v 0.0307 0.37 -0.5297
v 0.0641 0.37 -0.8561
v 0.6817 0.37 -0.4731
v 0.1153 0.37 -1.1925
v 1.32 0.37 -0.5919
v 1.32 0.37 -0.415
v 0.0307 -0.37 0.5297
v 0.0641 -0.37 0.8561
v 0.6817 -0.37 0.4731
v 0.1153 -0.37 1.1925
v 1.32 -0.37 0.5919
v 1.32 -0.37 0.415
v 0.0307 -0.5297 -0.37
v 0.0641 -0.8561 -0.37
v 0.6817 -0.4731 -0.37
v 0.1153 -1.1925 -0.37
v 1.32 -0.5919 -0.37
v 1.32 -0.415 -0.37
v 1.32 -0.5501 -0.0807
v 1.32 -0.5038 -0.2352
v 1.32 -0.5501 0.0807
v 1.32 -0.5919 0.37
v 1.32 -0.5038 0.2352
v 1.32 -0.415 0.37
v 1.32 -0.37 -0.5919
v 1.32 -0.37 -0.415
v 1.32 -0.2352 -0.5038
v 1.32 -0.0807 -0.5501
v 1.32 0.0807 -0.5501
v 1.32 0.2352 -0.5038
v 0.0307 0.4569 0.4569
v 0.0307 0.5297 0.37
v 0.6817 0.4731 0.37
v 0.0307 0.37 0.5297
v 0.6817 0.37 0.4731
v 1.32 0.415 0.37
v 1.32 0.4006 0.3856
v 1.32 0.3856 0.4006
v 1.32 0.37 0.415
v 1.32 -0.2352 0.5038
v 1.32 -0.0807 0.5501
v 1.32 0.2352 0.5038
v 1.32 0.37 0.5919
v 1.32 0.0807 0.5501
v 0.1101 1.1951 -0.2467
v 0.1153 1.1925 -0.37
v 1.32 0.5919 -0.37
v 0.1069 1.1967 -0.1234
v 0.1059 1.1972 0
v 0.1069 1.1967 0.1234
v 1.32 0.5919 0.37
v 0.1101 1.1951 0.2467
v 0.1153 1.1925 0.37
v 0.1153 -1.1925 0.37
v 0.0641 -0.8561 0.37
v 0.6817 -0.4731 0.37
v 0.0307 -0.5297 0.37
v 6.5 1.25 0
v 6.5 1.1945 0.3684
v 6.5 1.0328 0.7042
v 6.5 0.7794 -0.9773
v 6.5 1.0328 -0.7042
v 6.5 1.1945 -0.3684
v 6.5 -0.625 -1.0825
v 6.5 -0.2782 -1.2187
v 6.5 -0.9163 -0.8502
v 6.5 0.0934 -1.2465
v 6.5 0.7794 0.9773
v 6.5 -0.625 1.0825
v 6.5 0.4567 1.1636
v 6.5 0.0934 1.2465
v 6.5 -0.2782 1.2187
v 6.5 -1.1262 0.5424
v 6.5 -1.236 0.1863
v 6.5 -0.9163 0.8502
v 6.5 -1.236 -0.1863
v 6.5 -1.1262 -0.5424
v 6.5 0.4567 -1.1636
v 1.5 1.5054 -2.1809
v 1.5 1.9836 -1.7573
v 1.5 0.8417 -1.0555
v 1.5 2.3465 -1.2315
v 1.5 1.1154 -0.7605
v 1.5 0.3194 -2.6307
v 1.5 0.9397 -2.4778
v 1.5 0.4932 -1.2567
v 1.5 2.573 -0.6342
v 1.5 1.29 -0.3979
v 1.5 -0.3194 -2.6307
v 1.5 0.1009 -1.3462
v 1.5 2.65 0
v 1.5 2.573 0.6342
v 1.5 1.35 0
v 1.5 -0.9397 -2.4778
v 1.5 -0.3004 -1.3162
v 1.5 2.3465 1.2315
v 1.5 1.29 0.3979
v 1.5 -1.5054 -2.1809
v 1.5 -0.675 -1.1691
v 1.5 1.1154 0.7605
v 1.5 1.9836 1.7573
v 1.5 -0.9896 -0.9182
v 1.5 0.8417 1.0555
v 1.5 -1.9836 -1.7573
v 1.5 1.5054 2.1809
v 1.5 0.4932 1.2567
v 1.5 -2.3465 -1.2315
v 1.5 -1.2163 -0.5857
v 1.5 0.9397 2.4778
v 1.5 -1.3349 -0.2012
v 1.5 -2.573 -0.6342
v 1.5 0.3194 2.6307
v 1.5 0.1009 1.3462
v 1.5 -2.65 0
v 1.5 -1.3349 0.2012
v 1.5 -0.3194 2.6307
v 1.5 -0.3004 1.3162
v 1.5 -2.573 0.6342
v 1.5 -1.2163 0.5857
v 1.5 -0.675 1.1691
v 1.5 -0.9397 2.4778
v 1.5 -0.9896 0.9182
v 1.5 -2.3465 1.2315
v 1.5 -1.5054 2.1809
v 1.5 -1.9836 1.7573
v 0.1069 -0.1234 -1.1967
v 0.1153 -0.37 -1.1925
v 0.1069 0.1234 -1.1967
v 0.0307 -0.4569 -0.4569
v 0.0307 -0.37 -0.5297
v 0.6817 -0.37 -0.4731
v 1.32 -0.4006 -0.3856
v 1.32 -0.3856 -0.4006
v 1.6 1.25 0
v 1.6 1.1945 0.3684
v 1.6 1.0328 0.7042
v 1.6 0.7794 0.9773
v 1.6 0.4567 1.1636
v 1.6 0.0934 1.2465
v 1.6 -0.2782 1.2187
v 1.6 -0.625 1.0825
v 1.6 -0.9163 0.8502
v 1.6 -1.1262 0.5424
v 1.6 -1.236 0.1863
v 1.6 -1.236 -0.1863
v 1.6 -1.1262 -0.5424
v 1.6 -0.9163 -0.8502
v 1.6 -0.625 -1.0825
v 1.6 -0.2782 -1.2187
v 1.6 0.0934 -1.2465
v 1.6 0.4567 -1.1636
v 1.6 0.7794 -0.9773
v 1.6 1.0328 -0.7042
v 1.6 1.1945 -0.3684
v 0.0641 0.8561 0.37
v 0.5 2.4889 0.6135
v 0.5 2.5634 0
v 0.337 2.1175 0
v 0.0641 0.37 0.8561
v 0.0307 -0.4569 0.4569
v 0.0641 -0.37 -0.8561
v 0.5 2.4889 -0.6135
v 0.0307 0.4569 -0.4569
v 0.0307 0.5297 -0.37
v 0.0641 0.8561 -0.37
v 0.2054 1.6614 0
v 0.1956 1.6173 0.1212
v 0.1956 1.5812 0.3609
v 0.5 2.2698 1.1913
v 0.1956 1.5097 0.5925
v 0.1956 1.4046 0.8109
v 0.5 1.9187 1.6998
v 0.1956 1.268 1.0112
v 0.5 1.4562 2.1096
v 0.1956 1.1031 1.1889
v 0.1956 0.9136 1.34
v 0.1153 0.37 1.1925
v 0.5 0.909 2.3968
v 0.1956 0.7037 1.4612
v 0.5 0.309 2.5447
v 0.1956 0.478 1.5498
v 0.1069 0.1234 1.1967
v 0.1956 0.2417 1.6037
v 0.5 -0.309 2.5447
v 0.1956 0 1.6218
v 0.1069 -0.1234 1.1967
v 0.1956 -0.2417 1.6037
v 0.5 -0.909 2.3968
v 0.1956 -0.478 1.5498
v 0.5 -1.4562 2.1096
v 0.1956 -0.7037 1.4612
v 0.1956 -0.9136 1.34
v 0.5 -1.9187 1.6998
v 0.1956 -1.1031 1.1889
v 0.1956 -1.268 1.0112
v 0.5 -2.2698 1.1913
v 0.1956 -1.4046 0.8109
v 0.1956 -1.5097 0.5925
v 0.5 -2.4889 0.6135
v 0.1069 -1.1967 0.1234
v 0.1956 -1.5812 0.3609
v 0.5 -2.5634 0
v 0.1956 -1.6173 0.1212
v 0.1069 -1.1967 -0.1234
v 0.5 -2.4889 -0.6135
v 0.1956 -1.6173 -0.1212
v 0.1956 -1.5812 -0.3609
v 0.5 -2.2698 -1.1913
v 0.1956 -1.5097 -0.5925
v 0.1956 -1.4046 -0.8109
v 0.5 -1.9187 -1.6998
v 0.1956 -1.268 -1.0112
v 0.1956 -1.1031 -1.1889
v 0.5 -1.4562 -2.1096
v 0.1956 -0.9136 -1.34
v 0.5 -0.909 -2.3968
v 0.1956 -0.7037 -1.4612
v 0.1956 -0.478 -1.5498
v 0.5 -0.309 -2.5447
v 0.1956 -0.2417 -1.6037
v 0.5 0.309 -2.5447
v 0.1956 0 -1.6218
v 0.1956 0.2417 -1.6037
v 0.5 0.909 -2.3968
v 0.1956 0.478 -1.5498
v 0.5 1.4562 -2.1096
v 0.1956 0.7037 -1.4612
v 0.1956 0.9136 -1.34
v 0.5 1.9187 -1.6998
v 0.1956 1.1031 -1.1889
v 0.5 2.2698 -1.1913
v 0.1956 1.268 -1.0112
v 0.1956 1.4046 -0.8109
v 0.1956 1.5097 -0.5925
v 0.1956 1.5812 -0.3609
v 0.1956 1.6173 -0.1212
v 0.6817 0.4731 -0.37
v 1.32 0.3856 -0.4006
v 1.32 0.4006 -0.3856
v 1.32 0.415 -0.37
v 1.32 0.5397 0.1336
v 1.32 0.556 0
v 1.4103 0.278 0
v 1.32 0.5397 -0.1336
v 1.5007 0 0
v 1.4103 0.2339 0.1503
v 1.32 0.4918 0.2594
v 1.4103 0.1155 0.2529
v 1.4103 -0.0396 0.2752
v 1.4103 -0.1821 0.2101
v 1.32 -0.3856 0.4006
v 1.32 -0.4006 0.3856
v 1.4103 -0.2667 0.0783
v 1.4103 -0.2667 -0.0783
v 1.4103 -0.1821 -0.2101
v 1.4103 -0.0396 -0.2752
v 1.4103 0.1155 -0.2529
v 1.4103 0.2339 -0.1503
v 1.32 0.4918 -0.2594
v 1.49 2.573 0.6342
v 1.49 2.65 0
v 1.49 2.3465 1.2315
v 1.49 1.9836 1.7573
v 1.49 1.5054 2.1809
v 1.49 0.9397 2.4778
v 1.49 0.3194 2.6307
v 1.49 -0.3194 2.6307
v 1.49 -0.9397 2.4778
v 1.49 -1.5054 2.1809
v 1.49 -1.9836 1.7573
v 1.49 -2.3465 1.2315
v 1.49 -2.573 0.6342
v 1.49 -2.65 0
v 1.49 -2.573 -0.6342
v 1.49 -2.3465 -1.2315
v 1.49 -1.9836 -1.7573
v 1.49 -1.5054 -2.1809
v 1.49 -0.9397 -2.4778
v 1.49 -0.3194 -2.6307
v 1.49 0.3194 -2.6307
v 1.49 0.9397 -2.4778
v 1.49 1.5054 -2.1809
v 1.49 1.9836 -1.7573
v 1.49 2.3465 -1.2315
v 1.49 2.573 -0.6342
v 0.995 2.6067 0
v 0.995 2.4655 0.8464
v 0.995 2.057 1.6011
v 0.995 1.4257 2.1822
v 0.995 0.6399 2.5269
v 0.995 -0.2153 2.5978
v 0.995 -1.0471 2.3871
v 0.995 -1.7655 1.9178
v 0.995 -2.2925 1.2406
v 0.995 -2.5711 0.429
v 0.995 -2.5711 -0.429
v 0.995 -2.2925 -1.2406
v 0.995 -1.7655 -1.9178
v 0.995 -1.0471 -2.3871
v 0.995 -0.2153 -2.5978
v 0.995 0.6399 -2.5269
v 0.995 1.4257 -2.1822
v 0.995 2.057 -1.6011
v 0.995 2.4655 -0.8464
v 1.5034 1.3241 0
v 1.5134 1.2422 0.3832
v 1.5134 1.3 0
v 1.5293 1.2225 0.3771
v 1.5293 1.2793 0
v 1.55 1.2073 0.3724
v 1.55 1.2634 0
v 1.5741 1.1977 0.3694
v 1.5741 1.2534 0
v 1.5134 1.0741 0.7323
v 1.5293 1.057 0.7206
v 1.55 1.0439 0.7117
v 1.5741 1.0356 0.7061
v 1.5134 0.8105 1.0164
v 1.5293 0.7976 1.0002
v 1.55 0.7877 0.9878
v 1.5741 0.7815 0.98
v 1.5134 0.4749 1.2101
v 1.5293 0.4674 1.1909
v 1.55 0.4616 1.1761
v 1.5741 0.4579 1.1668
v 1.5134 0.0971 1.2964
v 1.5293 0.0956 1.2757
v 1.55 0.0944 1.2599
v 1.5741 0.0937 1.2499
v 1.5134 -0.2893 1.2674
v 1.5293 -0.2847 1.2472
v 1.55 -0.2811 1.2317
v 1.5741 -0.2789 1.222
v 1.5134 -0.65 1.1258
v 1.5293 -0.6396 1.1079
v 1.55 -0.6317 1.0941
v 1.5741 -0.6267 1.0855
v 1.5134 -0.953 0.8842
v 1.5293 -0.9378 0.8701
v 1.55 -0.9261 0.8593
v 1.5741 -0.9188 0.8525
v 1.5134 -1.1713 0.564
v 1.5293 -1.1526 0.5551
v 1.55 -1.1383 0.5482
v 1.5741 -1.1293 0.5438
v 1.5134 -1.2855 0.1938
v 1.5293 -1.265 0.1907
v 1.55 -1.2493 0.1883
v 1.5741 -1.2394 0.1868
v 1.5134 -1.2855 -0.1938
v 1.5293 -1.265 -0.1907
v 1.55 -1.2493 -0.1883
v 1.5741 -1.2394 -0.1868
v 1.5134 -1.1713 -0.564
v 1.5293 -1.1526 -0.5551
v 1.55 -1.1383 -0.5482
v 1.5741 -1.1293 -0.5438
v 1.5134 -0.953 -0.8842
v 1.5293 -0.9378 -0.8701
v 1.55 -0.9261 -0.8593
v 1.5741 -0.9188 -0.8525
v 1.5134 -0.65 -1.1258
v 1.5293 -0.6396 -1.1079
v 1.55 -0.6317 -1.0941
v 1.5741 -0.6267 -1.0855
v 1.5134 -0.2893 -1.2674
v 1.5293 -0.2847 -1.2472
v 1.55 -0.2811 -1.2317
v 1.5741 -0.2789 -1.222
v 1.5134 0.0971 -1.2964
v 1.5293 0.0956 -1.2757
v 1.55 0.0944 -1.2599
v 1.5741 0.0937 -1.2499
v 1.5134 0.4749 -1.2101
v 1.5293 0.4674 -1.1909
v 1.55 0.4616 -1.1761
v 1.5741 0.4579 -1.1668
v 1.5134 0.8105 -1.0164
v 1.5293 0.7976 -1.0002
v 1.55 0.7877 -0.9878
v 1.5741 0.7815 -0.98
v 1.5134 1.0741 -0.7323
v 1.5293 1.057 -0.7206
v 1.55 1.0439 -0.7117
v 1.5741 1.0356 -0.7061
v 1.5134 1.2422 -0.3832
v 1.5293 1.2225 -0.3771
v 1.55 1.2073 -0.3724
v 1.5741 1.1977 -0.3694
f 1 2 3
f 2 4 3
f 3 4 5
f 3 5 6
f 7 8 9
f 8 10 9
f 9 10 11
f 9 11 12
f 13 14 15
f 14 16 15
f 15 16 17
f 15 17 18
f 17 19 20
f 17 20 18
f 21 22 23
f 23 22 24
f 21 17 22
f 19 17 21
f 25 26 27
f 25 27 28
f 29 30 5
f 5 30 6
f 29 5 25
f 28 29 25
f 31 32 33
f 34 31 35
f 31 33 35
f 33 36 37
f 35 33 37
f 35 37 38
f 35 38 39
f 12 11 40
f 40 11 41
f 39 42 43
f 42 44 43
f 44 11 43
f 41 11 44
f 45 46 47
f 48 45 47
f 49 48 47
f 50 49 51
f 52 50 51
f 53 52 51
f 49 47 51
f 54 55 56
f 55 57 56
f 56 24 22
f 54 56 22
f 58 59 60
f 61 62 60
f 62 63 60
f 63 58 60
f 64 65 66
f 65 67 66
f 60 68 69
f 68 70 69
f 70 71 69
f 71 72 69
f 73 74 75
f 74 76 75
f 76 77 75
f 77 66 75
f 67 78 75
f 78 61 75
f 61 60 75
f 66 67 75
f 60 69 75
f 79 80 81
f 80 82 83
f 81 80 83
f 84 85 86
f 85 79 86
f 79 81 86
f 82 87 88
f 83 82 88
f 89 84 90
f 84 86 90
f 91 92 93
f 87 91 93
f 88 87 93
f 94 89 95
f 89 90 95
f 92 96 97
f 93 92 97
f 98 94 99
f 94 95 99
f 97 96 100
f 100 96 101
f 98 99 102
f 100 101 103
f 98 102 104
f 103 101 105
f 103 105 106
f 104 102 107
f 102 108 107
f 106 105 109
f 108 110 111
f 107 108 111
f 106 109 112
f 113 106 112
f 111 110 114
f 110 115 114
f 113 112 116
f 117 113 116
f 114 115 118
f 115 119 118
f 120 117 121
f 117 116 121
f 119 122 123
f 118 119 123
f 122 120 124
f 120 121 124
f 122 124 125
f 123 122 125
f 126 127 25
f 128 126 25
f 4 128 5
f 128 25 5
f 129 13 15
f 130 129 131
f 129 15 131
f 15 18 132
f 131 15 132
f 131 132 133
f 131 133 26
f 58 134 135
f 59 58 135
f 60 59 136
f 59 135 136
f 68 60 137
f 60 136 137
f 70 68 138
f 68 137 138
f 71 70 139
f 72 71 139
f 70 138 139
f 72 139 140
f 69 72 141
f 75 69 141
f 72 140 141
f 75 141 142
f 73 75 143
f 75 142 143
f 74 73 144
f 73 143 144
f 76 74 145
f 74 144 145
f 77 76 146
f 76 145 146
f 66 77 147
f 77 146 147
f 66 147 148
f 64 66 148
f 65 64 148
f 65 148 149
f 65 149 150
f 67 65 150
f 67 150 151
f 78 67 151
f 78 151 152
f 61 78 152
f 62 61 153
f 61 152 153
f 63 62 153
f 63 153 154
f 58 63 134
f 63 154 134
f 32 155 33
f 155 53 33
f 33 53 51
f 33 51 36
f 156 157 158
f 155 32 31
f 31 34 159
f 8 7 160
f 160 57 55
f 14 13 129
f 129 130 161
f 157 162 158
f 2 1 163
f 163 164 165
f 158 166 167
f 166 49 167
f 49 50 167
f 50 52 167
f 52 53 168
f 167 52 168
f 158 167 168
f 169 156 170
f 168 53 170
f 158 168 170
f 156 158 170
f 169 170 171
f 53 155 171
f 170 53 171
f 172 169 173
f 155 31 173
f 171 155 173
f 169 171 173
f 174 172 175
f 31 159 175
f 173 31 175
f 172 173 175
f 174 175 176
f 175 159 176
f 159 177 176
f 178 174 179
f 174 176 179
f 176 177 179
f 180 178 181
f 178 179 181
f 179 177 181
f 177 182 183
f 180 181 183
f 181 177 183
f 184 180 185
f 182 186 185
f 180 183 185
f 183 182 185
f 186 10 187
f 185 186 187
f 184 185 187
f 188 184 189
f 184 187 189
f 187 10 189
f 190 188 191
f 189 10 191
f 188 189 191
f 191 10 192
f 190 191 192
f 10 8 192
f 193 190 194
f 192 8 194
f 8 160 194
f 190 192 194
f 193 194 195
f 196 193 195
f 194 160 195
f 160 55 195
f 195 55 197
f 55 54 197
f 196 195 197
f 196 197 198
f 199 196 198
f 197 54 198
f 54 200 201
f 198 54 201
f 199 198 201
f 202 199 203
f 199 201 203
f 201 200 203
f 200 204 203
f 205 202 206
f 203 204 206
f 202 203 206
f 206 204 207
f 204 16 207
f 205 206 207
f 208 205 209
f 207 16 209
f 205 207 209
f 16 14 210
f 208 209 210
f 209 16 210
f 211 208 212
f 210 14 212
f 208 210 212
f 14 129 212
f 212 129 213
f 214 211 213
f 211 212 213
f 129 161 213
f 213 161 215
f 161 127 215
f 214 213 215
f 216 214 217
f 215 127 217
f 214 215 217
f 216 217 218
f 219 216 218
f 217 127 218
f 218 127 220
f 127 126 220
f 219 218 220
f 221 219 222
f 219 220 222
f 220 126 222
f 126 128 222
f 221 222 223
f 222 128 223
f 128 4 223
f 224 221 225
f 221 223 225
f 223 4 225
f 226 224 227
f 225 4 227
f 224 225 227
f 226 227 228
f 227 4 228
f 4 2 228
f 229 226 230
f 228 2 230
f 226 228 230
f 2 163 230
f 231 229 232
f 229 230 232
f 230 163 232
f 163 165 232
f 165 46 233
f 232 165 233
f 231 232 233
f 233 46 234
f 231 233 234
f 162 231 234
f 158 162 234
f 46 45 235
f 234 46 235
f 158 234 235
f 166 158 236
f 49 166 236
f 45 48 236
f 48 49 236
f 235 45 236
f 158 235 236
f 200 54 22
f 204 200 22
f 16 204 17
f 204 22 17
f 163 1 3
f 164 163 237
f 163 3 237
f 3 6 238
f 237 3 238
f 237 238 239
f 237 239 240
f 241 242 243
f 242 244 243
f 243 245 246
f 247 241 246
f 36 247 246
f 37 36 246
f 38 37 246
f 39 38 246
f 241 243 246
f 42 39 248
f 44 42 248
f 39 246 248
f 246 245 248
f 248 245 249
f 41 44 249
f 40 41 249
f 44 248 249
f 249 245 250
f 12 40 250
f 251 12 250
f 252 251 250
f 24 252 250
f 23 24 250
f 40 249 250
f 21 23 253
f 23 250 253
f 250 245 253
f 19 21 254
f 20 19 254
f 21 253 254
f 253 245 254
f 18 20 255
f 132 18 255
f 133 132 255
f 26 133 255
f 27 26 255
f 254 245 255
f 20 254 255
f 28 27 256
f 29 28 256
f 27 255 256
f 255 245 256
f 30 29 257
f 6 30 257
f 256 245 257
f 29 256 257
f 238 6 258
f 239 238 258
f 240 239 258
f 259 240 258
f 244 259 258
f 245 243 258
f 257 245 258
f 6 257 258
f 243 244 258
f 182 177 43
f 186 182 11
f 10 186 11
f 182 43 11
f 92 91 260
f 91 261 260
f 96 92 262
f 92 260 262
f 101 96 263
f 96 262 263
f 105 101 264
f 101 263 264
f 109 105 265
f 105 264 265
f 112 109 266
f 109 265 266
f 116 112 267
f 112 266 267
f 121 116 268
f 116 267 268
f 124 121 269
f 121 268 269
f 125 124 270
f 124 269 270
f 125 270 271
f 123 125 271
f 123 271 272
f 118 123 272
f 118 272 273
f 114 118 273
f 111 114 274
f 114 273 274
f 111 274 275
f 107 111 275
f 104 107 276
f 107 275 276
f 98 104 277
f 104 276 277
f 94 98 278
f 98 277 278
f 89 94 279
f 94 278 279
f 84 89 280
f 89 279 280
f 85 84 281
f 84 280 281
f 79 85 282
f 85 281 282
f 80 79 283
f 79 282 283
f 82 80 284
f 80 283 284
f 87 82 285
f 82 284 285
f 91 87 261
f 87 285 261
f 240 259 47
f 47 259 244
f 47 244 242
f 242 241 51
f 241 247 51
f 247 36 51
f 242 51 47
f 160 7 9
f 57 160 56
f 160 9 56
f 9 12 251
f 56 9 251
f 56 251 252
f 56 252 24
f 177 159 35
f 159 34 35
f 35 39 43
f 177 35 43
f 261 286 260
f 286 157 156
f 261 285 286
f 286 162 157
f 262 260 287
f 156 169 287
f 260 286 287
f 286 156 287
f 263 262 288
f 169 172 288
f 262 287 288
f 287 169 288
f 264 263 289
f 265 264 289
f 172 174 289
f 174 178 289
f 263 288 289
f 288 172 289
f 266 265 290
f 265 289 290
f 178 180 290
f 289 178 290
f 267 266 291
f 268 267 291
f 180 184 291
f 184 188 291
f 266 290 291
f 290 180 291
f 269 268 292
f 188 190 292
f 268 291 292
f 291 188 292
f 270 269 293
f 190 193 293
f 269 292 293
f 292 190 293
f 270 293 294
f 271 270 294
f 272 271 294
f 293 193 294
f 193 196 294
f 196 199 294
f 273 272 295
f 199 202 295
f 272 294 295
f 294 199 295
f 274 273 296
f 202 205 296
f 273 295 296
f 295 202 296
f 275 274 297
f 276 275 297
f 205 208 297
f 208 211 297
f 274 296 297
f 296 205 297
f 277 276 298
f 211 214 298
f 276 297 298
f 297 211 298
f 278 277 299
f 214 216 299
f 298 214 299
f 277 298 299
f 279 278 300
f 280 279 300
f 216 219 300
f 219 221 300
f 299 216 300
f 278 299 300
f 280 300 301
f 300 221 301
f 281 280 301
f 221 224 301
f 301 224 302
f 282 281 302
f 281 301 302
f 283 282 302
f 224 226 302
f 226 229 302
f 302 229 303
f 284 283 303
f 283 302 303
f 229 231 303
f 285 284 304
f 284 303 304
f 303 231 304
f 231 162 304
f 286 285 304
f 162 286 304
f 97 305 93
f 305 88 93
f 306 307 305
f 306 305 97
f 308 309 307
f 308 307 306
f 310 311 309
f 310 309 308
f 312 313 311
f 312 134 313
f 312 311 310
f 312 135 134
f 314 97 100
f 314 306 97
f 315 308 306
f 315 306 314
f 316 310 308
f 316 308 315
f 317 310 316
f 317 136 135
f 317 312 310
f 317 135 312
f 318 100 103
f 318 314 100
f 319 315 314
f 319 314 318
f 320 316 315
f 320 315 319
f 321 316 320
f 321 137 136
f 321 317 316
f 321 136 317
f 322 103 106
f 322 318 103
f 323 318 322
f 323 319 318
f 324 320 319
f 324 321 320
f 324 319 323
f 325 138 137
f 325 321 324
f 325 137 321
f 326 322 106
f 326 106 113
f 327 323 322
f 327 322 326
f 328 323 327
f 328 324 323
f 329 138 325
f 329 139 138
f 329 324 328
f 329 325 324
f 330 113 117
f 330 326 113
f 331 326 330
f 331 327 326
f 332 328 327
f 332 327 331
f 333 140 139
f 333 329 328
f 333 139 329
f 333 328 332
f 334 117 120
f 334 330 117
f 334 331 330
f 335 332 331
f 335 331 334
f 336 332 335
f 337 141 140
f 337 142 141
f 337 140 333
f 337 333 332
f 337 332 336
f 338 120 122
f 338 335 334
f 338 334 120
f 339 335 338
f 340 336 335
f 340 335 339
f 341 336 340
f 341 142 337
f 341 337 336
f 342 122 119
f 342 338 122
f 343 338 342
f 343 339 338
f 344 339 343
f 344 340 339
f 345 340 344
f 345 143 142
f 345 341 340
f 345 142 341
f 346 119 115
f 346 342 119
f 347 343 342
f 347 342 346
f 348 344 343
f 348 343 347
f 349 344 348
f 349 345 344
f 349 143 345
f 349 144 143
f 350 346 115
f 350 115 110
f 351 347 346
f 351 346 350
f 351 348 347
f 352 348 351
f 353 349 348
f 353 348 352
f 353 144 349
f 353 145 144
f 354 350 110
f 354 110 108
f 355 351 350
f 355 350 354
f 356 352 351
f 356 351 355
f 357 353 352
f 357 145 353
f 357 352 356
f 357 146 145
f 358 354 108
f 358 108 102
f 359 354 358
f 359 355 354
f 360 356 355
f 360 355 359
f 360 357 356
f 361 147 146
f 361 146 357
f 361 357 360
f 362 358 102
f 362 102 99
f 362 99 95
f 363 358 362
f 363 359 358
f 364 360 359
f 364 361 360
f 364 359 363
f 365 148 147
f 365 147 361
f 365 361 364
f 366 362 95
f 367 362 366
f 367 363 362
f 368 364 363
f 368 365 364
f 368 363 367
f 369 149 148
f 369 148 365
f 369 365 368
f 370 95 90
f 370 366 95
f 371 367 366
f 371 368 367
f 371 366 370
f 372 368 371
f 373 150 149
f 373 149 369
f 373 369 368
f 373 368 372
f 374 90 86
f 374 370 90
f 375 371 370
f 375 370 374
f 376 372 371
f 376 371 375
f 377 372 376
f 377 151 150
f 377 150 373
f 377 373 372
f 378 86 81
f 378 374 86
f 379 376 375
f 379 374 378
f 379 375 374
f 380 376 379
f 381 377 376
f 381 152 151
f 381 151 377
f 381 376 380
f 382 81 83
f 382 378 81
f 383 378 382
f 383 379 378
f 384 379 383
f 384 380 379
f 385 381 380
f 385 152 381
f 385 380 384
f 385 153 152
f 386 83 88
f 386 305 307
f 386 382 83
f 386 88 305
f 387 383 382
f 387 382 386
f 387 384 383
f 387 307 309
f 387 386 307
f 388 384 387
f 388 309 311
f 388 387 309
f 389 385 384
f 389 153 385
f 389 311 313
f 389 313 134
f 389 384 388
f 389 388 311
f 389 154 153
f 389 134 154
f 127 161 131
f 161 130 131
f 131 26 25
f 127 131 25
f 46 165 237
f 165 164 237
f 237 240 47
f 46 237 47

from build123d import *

# Parameters (mm, degrees)
FILLET1_R    = 0.1
SKETCH3_W    = 0.74
SKETCH3_H    = 2.5
SKETCH4_W    = 0.74
SKETCH4_H    = 1.183744774
RECPAT_COUNT = 2
RECPAT_ANGLE = 90


with BuildPart() as part:
    # BodySke → Base-Revolve (revolve)
    with BuildSketch(Plane.XY):
        with BuildLine():
            Line((1.5, 1.25), (1.5, 2.65))
            Line((1.5, 2.65), (1.49, 2.65))
            Line((1.49, 2.65), (0.5, 2.563386223))
            ThreePointArc((0.5, 2.563386223), (0.126166852, 1.305847323), (0, 0))
            Line((0, 0), (6.5, 0))
            Line((6.5, 0), (6.5, 1.25))
            Line((6.5, 1.25), (1.5, 1.25))
        make_face()
    revolve(axis=Axis((-25.4, 0, 0), (1, 0, 0)))

    # Fillet1
    fillet1_edges = [part.edges().sort_by_distance(p)[0] for p in [
        (1.5, -1.25, 0),
    ]]
    fillet(fillet1_edges, radius=FILLET1_R)

    # Sketch3 → Recess section 0
    with BuildSketch(Plane(origin=(0, 0, 0), x_dir=(0, 0, -1), z_dir=(1, 0, 0))):
        Rectangle(SKETCH3_W, SKETCH3_H)
    # Sketch4 → Recess section 1
    with BuildSketch(Plane(origin=(1.32, 0, 0), x_dir=(0, 0, -1), z_dir=(1, 0, 0))):
        Rectangle(SKETCH4_W, SKETCH4_H)
    recess = loft(mode=Mode.SUBTRACT)

    # RecPat: Recess ×2 about axis
    recpat_axis = Axis((0, 0, 0), (1, 0, 0))
    for i in range(1, RECPAT_COUNT):
        add(recess.rotate(recpat_axis, i * RECPAT_ANGLE / (RECPAT_COUNT - 1)), mode=Mode.SUBTRACT)

    # RecCorSke → RecessCore (revolve, cut)
    with BuildSketch(Plane.XY):
        Polygon((0, 0), (0, 0.648303392), (1.32, 0.556), (1.500655351, 0), align=None)
    revolve(axis=Axis((-3.175, 0, 0), (1, 0, 0)), mode=Mode.SUBTRACT)


solid = part.part
